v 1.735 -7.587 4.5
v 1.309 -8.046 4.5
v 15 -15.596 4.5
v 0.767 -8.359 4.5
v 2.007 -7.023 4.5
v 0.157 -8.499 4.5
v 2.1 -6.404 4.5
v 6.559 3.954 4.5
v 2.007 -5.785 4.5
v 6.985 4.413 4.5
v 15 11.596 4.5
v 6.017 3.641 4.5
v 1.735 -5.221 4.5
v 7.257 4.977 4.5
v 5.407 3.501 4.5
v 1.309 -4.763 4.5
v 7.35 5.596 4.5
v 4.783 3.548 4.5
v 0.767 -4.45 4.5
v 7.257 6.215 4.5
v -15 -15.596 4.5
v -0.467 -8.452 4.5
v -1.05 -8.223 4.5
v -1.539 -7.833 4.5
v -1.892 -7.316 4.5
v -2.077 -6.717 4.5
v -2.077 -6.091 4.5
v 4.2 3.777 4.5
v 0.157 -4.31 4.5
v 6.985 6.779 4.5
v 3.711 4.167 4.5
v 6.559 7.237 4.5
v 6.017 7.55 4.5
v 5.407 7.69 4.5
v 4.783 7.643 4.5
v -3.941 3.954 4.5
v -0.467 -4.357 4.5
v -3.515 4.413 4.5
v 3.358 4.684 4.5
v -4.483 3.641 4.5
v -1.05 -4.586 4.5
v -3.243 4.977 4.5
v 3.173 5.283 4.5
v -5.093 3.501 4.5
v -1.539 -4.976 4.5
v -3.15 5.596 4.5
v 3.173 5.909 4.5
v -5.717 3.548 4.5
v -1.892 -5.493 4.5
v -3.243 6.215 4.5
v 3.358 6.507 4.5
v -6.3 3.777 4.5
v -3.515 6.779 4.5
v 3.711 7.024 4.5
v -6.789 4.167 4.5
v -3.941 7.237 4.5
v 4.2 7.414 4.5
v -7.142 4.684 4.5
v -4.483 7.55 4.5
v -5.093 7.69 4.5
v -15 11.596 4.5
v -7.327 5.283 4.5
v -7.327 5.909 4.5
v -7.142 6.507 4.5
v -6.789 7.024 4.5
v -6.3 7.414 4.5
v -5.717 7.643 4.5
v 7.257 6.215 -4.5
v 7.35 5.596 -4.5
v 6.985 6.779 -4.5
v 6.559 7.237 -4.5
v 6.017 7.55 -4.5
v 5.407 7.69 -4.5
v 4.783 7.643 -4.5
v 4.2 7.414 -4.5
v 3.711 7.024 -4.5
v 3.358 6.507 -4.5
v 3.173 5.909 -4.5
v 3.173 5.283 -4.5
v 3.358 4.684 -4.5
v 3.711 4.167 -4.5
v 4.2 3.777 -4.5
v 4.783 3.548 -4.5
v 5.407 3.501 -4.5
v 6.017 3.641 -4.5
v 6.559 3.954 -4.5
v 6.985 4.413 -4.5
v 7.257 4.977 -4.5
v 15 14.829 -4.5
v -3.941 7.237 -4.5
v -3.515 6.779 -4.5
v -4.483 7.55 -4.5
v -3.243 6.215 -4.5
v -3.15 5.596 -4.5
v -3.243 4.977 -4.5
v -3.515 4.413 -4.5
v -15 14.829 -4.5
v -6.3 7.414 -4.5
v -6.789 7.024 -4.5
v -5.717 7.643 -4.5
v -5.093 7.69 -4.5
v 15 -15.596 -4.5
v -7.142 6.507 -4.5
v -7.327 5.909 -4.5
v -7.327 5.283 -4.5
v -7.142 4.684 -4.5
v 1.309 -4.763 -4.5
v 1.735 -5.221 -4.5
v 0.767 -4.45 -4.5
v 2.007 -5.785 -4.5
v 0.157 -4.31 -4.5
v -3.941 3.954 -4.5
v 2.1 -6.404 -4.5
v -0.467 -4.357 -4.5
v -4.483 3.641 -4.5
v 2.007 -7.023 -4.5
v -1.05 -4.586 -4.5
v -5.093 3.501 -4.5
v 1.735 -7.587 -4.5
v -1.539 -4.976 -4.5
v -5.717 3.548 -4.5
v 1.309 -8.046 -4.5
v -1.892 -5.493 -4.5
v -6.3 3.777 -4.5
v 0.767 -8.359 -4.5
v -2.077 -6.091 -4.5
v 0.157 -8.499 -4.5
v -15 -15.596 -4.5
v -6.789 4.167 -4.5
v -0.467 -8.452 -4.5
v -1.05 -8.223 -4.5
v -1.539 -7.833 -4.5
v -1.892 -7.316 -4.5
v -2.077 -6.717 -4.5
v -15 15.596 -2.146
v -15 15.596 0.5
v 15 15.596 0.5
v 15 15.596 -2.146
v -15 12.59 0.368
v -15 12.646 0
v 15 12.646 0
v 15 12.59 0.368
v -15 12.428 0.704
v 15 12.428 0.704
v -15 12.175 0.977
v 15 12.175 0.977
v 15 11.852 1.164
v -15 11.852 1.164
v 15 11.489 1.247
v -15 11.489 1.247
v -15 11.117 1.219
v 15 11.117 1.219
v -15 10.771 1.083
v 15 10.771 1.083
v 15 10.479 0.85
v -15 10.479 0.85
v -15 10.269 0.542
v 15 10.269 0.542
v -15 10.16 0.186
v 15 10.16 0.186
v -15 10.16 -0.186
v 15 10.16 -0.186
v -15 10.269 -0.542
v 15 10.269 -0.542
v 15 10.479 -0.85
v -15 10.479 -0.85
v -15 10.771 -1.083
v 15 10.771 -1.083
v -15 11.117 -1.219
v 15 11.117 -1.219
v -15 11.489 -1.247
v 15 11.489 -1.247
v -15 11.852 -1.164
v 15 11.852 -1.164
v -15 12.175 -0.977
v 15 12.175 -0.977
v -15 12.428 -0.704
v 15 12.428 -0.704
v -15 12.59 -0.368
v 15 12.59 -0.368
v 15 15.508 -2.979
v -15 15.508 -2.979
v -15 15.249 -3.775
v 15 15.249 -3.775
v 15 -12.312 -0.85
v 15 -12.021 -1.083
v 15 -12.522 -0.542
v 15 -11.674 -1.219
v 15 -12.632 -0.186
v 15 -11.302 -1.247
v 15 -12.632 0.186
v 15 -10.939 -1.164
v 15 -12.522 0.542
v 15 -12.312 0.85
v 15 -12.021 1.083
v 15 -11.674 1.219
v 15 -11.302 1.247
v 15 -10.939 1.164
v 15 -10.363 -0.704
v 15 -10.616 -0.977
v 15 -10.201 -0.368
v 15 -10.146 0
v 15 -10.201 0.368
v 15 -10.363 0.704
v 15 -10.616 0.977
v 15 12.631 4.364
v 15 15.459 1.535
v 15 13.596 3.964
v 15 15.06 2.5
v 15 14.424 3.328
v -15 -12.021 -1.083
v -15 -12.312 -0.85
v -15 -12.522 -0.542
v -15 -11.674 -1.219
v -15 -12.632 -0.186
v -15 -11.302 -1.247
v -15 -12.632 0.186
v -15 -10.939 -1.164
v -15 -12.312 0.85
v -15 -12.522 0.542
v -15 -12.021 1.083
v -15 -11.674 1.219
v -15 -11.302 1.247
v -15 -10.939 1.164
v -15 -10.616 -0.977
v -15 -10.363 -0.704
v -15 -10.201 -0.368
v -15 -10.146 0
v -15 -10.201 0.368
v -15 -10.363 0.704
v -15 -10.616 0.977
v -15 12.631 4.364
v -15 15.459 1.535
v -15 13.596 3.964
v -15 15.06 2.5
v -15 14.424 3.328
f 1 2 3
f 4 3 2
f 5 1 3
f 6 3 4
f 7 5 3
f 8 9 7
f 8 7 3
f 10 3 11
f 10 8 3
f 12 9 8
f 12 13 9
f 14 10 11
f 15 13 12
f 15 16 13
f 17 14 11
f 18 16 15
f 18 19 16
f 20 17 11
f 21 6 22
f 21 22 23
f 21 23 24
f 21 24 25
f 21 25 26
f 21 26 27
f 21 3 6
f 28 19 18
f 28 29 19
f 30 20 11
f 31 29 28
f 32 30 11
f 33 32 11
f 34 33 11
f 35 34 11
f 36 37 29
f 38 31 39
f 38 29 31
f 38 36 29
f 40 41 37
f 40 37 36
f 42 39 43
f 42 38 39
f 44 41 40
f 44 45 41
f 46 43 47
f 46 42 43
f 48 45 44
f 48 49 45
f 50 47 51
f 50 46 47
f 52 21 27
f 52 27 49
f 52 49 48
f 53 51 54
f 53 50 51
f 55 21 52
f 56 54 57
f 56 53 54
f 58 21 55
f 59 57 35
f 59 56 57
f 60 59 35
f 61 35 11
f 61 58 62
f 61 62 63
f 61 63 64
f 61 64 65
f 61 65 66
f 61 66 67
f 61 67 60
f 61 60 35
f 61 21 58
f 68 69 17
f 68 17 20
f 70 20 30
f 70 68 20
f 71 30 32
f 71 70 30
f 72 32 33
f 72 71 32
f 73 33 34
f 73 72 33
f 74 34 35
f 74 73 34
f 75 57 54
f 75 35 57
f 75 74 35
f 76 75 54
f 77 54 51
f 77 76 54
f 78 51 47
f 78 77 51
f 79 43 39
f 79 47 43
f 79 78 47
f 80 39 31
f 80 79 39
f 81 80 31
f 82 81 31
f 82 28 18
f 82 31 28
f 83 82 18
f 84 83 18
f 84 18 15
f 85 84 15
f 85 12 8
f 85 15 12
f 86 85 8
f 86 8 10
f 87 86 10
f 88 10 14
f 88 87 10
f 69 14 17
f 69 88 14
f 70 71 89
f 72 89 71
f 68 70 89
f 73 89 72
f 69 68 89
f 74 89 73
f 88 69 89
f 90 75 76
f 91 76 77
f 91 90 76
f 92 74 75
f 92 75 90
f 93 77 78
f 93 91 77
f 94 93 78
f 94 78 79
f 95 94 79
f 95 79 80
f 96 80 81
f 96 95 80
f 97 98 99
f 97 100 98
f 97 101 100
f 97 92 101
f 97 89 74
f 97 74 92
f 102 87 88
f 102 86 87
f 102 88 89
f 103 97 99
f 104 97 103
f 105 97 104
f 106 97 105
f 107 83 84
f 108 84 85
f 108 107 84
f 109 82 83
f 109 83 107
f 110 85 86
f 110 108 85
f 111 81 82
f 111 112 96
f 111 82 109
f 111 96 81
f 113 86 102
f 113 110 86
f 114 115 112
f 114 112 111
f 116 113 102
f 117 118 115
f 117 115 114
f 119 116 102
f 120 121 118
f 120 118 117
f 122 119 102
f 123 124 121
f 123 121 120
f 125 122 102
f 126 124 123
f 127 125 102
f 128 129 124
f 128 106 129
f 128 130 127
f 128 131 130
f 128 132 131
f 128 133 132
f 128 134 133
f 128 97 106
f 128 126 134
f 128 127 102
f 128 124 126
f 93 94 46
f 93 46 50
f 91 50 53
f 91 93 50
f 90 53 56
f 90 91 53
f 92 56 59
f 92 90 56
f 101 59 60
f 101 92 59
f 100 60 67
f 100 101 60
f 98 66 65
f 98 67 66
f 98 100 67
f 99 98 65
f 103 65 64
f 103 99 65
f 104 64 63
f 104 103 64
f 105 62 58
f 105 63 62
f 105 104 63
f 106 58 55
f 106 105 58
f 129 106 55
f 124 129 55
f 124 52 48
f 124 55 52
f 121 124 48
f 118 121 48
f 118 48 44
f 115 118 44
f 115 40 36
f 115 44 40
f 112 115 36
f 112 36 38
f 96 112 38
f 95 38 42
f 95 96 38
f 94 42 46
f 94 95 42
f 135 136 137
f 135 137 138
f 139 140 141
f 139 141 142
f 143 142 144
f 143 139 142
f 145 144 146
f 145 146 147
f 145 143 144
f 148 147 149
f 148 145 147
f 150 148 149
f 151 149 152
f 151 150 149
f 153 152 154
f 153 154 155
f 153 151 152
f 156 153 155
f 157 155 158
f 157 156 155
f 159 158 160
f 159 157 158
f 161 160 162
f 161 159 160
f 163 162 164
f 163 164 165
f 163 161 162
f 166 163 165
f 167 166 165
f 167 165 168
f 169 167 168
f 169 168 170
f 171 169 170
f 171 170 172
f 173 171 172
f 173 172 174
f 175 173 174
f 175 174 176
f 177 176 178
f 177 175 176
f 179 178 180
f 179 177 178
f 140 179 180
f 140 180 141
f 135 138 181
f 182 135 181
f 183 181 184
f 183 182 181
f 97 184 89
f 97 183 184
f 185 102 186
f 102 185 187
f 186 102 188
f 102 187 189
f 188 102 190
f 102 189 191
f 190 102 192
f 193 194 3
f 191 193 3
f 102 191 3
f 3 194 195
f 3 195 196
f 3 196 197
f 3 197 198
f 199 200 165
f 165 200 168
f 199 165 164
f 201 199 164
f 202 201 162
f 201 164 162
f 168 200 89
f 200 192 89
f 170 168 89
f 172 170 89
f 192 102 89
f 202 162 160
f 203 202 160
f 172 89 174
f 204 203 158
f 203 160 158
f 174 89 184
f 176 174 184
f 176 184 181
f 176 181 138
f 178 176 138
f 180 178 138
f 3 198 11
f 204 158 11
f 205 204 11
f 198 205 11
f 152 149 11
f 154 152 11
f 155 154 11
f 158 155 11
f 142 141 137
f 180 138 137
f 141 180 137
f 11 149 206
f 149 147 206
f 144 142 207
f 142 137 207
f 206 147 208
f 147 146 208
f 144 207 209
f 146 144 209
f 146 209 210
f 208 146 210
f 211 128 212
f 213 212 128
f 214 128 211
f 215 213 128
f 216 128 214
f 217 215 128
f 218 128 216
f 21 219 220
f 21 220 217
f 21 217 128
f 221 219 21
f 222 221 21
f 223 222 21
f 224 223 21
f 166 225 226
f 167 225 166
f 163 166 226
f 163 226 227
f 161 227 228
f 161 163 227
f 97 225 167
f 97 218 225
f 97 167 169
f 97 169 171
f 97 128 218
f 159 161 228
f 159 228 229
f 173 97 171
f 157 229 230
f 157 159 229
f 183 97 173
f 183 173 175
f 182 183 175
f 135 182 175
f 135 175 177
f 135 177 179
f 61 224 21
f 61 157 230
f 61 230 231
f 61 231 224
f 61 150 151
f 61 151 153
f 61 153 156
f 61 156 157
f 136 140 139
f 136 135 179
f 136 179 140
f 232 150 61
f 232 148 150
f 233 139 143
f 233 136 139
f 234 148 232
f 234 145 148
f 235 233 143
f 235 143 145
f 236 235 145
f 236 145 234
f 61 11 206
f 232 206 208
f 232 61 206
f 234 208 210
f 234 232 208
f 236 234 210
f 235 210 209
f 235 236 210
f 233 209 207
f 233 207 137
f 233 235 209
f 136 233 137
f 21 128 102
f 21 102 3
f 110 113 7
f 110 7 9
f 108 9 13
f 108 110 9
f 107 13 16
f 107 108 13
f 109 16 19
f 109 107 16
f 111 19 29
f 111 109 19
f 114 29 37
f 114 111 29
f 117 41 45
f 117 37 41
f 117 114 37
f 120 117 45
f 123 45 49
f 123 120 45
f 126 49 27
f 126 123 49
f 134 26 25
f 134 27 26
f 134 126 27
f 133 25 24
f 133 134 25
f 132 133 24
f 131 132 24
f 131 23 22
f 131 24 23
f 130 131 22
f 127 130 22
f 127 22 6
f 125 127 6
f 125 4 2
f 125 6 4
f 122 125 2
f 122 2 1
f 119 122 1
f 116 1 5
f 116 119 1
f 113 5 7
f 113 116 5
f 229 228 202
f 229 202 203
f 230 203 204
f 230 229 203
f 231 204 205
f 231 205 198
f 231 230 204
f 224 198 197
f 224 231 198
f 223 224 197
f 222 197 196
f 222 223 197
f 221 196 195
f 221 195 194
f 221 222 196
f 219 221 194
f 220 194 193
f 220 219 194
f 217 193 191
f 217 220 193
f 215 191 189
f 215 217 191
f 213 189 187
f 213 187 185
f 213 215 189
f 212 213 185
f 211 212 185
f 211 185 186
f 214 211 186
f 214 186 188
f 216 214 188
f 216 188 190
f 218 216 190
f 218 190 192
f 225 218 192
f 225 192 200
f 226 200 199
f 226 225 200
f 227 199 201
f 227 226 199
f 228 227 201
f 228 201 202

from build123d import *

# Parameters (mm, degrees)
MAINBODY_EXTRUDE_START                     = -15
MAINBODY_EXTRUDE_DEPTH                     = 30
VISESCREWSTHREADEDHOLES_CUT_DEPTH          = 23.101437038
VISESCREWSTHREADEDHOLES_CUT_DEPTH_BACK     = 23.101437038
VISESCREWSTHREADEDHOLES_SKETCH_R           = 2.1
CUT_EXTRUDE2_DEPTH                         = 24.435518325
CUT_EXTRUDE2_DEPTH_BACK                    = 19.935518325
CUT_EXTRUDE2_START                         = -4.5
THREADEDHOLEFORTERMINALSCREW_SKETCH_R      = 2.1
MOUNTINGHOLETOSIDEPLATESEEDFODDER_START    = -2.145727099
MOUNTINGHOLETOSIDEPLATESEEDFODDER_OUTLIN_W = 30
MOUNTINGHOLETOSIDEPLATESEEDFODDER_OUTLIN_H = 31.19125
MOUNTINGHOLETOSIDEPLATESEEDFODDER_OUTLIN_R = 2.1
MOUNTINGHOLETOSIDEPLATESEEDFODDER_DEPTH    = 2.645727099
MOUNTINGHOLETOSIDEPLATESEEDFODDER_START_2  = -15
MOUNTINGHOLETOSIDEPLATESEEDFODDER_2_DEPTH  = 30
MOUNTINGHOLETOSIDEPLATESEEDFODDER_START_3  = -4.5
MOUNTINGHOLETOSIDEPLATESEEDFODDER_3_OUTL_R = 2.1
MOUNTINGHOLETOSIDEPLATESEEDFODDER_3_DEPTH  = 9
MOUNTINGHOLETOSIDEPLATESEED_SKETCH_R       = 1.25
MOUNTINGHOLETOSIDEPLATESEED_CUT_DEPTH      = 23.101437038
MOUNTINGHOLESTOSIDEPLATE_PATTERN_START     = -15
MOUNTINGHOLESTOSIDEPLATE_PATTERN_OUTLINE_R = 1.25
MOUNTINGHOLESTOSIDEPLATE_PATTERN_DEPTH     = 30


with BuildPart() as part:
    # projectionX_sketch → mainBody_extrude (new body)
    with BuildSketch(Plane(origin=(0, 0, 0), x_dir=(0, 0, -1), z_dir=(1, 0, 0)).offset(MAINBODY_EXTRUDE_START)):
        with BuildLine():
            Line((-0.5, 15.595625), (2.145727099, 15.595625))
            ThreePointArc((2.145727099, 15.595625), (3.383636459, 15.399252271), (4.5, 14.829415207))
            Line((4.5, 14.829415207), (4.5, -15.595625))
            Line((4.5, -15.595625), (-4.5, -15.595625))
            Line((-4.5, -15.595625), (-4.5, 11.595625))
            ThreePointArc((-4.5, 11.595625), (-3.328427125, 14.424052125), (-0.5, 15.595625))
        make_face()
    extrude(amount=MAINBODY_EXTRUDE_DEPTH)

    # viseScrewsThreadedHoles_sketch → viseScrewsThreadedHoles_cut (cut, two sides: drawn at the far end of the back side and taken through both)
    with BuildSketch(Plane.XY.offset(-VISESCREWSTHREADEDHOLES_CUT_DEPTH_BACK)):
        with Locations((-5.25, 5.595625)):
            Circle(VISESCREWSTHREADEDHOLES_SKETCH_R)
        with Locations((5.25, 5.595625)):
            Circle(VISESCREWSTHREADEDHOLES_SKETCH_R)
    extrude(amount=VISESCREWSTHREADEDHOLES_CUT_DEPTH + VISESCREWSTHREADEDHOLES_CUT_DEPTH_BACK, mode=Mode.SUBTRACT)

    # threadedHoleForTerminalScrew_sketch → Cut-Extrude2 (cut, two sides: drawn at the far end of the back side and taken through both)
    with BuildSketch(Plane.XY.offset(4.5).offset(CUT_EXTRUDE2_START - CUT_EXTRUDE2_DEPTH_BACK)):
        with Locations((0, -6.404375)):
            Circle(THREADEDHOLEFORTERMINALSCREW_SKETCH_R)
    extrude(amount=CUT_EXTRUDE2_DEPTH + CUT_EXTRUDE2_DEPTH_BACK, mode=Mode.SUBTRACT)

    # mountingHolesToSidePlate_pattern: read off the stored shape, not the designer's step
    # mountingHolesToSidePlate_pattern outline → mountingHolesToSidePlate_pattern (cut)
    with BuildSketch(Plane.YZ.offset(MOUNTINGHOLESTOSIDEPLATE_PATTERN_START)):
        with Locations((-11.395625, 0)):
            Circle(MOUNTINGHOLESTOSIDEPLATE_PATTERN_OUTLINE_R)
        with Locations((11.395625, 0)):
            Circle(MOUNTINGHOLESTOSIDEPLATE_PATTERN_OUTLINE_R)
    extrude(amount=MOUNTINGHOLESTOSIDEPLATE_PATTERN_DEPTH, mode=Mode.SUBTRACT)


with BuildPart() as body_2:
    # mountingHoleToSidePlateSeedFodder: read off the stored shape, not the designer's step
    # mountingHoleToSidePlateSeedFodder outlin → mountingHoleToSidePlateSeedFodder (new body)
    with BuildSketch(Plane.XY.offset(MOUNTINGHOLETOSIDEPLATESEEDFODDER_START)):
        Rectangle(MOUNTINGHOLETOSIDEPLATESEEDFODDER_OUTLIN_W, MOUNTINGHOLETOSIDEPLATESEEDFODDER_OUTLIN_H)
        with Locations((0, -6.404375)):
            Circle(MOUNTINGHOLETOSIDEPLATESEEDFODDER_OUTLIN_R, mode=Mode.SUBTRACT)
        with Locations((-5.25, 5.595625)):
            Circle(MOUNTINGHOLETOSIDEPLATESEEDFODDER_OUTLIN_R, mode=Mode.SUBTRACT)
        with Locations((5.25, 5.595625)):
            Circle(MOUNTINGHOLETOSIDEPLATESEEDFODDER_OUTLIN_R, mode=Mode.SUBTRACT)
    extrude(amount=MOUNTINGHOLETOSIDEPLATESEEDFODDER_DEPTH)

    # mountingHoleToSidePlateSeedFodder 2 outl → mountingHoleToSidePlateSeedFodder 2 (add)
    with BuildSketch(Plane.YZ.offset(MOUNTINGHOLETOSIDEPLATESEEDFODDER_START_2)):
        with BuildLine():
            Line((15.595625, -2.145727099), (-15.595625, -2.145727099))
            Line((-15.595625, -2.145727099), (-15.595625, -4.5))
            Line((-15.595625, -4.5), (14.829415207, -4.5))
            ThreePointArc((14.829415207, -4.5), (15.399252271, -3.38363646), (15.595625, -2.145727099))
        make_face()
        with BuildLine():
            ThreePointArc((15.595625, 0.5), (14.424052125, 3.328427125), (11.595625, 4.5))
            Line((11.595625, 4.5), (-15.595625, 4.5))
            Line((-15.595625, 4.5), (-15.595625, 0.5))
            Line((-15.595625, 0.5), (15.595625, 0.5))
        make_face()
    extrude(amount=MOUNTINGHOLETOSIDEPLATESEEDFODDER_2_DEPTH)

    # mountingHoleToSidePlateSeedFodder 3 outl → mountingHoleToSidePlateSeedFodder 3 (cut)
    with BuildSketch(Plane.XY.offset(MOUNTINGHOLETOSIDEPLATESEEDFODDER_START_3)):
        with Locations((5.25, 5.595625)):
            Circle(MOUNTINGHOLETOSIDEPLATESEEDFODDER_3_OUTL_R)
        with Locations((-5.25, 5.595625)):
            Circle(MOUNTINGHOLETOSIDEPLATESEEDFODDER_3_OUTL_R)
        with Locations((0, -6.404375)):
            Circle(MOUNTINGHOLETOSIDEPLATESEEDFODDER_3_OUTL_R)
    extrude(amount=MOUNTINGHOLETOSIDEPLATESEEDFODDER_3_DEPTH, mode=Mode.SUBTRACT)

    # mountingHoleToSidePlateSeed_sketch → mountingHoleToSidePlateSeed_cut (cut, symmetric)
    with BuildSketch(Plane(origin=(0, 0, 0), x_dir=(0, 0, -1), z_dir=(1, 0, 0))):
        Circle(MOUNTINGHOLETOSIDEPLATESEED_SKETCH_R)
    extrude(amount=MOUNTINGHOLETOSIDEPLATESEED_CUT_DEPTH, both=True, mode=Mode.SUBTRACT)


solid = part.part
